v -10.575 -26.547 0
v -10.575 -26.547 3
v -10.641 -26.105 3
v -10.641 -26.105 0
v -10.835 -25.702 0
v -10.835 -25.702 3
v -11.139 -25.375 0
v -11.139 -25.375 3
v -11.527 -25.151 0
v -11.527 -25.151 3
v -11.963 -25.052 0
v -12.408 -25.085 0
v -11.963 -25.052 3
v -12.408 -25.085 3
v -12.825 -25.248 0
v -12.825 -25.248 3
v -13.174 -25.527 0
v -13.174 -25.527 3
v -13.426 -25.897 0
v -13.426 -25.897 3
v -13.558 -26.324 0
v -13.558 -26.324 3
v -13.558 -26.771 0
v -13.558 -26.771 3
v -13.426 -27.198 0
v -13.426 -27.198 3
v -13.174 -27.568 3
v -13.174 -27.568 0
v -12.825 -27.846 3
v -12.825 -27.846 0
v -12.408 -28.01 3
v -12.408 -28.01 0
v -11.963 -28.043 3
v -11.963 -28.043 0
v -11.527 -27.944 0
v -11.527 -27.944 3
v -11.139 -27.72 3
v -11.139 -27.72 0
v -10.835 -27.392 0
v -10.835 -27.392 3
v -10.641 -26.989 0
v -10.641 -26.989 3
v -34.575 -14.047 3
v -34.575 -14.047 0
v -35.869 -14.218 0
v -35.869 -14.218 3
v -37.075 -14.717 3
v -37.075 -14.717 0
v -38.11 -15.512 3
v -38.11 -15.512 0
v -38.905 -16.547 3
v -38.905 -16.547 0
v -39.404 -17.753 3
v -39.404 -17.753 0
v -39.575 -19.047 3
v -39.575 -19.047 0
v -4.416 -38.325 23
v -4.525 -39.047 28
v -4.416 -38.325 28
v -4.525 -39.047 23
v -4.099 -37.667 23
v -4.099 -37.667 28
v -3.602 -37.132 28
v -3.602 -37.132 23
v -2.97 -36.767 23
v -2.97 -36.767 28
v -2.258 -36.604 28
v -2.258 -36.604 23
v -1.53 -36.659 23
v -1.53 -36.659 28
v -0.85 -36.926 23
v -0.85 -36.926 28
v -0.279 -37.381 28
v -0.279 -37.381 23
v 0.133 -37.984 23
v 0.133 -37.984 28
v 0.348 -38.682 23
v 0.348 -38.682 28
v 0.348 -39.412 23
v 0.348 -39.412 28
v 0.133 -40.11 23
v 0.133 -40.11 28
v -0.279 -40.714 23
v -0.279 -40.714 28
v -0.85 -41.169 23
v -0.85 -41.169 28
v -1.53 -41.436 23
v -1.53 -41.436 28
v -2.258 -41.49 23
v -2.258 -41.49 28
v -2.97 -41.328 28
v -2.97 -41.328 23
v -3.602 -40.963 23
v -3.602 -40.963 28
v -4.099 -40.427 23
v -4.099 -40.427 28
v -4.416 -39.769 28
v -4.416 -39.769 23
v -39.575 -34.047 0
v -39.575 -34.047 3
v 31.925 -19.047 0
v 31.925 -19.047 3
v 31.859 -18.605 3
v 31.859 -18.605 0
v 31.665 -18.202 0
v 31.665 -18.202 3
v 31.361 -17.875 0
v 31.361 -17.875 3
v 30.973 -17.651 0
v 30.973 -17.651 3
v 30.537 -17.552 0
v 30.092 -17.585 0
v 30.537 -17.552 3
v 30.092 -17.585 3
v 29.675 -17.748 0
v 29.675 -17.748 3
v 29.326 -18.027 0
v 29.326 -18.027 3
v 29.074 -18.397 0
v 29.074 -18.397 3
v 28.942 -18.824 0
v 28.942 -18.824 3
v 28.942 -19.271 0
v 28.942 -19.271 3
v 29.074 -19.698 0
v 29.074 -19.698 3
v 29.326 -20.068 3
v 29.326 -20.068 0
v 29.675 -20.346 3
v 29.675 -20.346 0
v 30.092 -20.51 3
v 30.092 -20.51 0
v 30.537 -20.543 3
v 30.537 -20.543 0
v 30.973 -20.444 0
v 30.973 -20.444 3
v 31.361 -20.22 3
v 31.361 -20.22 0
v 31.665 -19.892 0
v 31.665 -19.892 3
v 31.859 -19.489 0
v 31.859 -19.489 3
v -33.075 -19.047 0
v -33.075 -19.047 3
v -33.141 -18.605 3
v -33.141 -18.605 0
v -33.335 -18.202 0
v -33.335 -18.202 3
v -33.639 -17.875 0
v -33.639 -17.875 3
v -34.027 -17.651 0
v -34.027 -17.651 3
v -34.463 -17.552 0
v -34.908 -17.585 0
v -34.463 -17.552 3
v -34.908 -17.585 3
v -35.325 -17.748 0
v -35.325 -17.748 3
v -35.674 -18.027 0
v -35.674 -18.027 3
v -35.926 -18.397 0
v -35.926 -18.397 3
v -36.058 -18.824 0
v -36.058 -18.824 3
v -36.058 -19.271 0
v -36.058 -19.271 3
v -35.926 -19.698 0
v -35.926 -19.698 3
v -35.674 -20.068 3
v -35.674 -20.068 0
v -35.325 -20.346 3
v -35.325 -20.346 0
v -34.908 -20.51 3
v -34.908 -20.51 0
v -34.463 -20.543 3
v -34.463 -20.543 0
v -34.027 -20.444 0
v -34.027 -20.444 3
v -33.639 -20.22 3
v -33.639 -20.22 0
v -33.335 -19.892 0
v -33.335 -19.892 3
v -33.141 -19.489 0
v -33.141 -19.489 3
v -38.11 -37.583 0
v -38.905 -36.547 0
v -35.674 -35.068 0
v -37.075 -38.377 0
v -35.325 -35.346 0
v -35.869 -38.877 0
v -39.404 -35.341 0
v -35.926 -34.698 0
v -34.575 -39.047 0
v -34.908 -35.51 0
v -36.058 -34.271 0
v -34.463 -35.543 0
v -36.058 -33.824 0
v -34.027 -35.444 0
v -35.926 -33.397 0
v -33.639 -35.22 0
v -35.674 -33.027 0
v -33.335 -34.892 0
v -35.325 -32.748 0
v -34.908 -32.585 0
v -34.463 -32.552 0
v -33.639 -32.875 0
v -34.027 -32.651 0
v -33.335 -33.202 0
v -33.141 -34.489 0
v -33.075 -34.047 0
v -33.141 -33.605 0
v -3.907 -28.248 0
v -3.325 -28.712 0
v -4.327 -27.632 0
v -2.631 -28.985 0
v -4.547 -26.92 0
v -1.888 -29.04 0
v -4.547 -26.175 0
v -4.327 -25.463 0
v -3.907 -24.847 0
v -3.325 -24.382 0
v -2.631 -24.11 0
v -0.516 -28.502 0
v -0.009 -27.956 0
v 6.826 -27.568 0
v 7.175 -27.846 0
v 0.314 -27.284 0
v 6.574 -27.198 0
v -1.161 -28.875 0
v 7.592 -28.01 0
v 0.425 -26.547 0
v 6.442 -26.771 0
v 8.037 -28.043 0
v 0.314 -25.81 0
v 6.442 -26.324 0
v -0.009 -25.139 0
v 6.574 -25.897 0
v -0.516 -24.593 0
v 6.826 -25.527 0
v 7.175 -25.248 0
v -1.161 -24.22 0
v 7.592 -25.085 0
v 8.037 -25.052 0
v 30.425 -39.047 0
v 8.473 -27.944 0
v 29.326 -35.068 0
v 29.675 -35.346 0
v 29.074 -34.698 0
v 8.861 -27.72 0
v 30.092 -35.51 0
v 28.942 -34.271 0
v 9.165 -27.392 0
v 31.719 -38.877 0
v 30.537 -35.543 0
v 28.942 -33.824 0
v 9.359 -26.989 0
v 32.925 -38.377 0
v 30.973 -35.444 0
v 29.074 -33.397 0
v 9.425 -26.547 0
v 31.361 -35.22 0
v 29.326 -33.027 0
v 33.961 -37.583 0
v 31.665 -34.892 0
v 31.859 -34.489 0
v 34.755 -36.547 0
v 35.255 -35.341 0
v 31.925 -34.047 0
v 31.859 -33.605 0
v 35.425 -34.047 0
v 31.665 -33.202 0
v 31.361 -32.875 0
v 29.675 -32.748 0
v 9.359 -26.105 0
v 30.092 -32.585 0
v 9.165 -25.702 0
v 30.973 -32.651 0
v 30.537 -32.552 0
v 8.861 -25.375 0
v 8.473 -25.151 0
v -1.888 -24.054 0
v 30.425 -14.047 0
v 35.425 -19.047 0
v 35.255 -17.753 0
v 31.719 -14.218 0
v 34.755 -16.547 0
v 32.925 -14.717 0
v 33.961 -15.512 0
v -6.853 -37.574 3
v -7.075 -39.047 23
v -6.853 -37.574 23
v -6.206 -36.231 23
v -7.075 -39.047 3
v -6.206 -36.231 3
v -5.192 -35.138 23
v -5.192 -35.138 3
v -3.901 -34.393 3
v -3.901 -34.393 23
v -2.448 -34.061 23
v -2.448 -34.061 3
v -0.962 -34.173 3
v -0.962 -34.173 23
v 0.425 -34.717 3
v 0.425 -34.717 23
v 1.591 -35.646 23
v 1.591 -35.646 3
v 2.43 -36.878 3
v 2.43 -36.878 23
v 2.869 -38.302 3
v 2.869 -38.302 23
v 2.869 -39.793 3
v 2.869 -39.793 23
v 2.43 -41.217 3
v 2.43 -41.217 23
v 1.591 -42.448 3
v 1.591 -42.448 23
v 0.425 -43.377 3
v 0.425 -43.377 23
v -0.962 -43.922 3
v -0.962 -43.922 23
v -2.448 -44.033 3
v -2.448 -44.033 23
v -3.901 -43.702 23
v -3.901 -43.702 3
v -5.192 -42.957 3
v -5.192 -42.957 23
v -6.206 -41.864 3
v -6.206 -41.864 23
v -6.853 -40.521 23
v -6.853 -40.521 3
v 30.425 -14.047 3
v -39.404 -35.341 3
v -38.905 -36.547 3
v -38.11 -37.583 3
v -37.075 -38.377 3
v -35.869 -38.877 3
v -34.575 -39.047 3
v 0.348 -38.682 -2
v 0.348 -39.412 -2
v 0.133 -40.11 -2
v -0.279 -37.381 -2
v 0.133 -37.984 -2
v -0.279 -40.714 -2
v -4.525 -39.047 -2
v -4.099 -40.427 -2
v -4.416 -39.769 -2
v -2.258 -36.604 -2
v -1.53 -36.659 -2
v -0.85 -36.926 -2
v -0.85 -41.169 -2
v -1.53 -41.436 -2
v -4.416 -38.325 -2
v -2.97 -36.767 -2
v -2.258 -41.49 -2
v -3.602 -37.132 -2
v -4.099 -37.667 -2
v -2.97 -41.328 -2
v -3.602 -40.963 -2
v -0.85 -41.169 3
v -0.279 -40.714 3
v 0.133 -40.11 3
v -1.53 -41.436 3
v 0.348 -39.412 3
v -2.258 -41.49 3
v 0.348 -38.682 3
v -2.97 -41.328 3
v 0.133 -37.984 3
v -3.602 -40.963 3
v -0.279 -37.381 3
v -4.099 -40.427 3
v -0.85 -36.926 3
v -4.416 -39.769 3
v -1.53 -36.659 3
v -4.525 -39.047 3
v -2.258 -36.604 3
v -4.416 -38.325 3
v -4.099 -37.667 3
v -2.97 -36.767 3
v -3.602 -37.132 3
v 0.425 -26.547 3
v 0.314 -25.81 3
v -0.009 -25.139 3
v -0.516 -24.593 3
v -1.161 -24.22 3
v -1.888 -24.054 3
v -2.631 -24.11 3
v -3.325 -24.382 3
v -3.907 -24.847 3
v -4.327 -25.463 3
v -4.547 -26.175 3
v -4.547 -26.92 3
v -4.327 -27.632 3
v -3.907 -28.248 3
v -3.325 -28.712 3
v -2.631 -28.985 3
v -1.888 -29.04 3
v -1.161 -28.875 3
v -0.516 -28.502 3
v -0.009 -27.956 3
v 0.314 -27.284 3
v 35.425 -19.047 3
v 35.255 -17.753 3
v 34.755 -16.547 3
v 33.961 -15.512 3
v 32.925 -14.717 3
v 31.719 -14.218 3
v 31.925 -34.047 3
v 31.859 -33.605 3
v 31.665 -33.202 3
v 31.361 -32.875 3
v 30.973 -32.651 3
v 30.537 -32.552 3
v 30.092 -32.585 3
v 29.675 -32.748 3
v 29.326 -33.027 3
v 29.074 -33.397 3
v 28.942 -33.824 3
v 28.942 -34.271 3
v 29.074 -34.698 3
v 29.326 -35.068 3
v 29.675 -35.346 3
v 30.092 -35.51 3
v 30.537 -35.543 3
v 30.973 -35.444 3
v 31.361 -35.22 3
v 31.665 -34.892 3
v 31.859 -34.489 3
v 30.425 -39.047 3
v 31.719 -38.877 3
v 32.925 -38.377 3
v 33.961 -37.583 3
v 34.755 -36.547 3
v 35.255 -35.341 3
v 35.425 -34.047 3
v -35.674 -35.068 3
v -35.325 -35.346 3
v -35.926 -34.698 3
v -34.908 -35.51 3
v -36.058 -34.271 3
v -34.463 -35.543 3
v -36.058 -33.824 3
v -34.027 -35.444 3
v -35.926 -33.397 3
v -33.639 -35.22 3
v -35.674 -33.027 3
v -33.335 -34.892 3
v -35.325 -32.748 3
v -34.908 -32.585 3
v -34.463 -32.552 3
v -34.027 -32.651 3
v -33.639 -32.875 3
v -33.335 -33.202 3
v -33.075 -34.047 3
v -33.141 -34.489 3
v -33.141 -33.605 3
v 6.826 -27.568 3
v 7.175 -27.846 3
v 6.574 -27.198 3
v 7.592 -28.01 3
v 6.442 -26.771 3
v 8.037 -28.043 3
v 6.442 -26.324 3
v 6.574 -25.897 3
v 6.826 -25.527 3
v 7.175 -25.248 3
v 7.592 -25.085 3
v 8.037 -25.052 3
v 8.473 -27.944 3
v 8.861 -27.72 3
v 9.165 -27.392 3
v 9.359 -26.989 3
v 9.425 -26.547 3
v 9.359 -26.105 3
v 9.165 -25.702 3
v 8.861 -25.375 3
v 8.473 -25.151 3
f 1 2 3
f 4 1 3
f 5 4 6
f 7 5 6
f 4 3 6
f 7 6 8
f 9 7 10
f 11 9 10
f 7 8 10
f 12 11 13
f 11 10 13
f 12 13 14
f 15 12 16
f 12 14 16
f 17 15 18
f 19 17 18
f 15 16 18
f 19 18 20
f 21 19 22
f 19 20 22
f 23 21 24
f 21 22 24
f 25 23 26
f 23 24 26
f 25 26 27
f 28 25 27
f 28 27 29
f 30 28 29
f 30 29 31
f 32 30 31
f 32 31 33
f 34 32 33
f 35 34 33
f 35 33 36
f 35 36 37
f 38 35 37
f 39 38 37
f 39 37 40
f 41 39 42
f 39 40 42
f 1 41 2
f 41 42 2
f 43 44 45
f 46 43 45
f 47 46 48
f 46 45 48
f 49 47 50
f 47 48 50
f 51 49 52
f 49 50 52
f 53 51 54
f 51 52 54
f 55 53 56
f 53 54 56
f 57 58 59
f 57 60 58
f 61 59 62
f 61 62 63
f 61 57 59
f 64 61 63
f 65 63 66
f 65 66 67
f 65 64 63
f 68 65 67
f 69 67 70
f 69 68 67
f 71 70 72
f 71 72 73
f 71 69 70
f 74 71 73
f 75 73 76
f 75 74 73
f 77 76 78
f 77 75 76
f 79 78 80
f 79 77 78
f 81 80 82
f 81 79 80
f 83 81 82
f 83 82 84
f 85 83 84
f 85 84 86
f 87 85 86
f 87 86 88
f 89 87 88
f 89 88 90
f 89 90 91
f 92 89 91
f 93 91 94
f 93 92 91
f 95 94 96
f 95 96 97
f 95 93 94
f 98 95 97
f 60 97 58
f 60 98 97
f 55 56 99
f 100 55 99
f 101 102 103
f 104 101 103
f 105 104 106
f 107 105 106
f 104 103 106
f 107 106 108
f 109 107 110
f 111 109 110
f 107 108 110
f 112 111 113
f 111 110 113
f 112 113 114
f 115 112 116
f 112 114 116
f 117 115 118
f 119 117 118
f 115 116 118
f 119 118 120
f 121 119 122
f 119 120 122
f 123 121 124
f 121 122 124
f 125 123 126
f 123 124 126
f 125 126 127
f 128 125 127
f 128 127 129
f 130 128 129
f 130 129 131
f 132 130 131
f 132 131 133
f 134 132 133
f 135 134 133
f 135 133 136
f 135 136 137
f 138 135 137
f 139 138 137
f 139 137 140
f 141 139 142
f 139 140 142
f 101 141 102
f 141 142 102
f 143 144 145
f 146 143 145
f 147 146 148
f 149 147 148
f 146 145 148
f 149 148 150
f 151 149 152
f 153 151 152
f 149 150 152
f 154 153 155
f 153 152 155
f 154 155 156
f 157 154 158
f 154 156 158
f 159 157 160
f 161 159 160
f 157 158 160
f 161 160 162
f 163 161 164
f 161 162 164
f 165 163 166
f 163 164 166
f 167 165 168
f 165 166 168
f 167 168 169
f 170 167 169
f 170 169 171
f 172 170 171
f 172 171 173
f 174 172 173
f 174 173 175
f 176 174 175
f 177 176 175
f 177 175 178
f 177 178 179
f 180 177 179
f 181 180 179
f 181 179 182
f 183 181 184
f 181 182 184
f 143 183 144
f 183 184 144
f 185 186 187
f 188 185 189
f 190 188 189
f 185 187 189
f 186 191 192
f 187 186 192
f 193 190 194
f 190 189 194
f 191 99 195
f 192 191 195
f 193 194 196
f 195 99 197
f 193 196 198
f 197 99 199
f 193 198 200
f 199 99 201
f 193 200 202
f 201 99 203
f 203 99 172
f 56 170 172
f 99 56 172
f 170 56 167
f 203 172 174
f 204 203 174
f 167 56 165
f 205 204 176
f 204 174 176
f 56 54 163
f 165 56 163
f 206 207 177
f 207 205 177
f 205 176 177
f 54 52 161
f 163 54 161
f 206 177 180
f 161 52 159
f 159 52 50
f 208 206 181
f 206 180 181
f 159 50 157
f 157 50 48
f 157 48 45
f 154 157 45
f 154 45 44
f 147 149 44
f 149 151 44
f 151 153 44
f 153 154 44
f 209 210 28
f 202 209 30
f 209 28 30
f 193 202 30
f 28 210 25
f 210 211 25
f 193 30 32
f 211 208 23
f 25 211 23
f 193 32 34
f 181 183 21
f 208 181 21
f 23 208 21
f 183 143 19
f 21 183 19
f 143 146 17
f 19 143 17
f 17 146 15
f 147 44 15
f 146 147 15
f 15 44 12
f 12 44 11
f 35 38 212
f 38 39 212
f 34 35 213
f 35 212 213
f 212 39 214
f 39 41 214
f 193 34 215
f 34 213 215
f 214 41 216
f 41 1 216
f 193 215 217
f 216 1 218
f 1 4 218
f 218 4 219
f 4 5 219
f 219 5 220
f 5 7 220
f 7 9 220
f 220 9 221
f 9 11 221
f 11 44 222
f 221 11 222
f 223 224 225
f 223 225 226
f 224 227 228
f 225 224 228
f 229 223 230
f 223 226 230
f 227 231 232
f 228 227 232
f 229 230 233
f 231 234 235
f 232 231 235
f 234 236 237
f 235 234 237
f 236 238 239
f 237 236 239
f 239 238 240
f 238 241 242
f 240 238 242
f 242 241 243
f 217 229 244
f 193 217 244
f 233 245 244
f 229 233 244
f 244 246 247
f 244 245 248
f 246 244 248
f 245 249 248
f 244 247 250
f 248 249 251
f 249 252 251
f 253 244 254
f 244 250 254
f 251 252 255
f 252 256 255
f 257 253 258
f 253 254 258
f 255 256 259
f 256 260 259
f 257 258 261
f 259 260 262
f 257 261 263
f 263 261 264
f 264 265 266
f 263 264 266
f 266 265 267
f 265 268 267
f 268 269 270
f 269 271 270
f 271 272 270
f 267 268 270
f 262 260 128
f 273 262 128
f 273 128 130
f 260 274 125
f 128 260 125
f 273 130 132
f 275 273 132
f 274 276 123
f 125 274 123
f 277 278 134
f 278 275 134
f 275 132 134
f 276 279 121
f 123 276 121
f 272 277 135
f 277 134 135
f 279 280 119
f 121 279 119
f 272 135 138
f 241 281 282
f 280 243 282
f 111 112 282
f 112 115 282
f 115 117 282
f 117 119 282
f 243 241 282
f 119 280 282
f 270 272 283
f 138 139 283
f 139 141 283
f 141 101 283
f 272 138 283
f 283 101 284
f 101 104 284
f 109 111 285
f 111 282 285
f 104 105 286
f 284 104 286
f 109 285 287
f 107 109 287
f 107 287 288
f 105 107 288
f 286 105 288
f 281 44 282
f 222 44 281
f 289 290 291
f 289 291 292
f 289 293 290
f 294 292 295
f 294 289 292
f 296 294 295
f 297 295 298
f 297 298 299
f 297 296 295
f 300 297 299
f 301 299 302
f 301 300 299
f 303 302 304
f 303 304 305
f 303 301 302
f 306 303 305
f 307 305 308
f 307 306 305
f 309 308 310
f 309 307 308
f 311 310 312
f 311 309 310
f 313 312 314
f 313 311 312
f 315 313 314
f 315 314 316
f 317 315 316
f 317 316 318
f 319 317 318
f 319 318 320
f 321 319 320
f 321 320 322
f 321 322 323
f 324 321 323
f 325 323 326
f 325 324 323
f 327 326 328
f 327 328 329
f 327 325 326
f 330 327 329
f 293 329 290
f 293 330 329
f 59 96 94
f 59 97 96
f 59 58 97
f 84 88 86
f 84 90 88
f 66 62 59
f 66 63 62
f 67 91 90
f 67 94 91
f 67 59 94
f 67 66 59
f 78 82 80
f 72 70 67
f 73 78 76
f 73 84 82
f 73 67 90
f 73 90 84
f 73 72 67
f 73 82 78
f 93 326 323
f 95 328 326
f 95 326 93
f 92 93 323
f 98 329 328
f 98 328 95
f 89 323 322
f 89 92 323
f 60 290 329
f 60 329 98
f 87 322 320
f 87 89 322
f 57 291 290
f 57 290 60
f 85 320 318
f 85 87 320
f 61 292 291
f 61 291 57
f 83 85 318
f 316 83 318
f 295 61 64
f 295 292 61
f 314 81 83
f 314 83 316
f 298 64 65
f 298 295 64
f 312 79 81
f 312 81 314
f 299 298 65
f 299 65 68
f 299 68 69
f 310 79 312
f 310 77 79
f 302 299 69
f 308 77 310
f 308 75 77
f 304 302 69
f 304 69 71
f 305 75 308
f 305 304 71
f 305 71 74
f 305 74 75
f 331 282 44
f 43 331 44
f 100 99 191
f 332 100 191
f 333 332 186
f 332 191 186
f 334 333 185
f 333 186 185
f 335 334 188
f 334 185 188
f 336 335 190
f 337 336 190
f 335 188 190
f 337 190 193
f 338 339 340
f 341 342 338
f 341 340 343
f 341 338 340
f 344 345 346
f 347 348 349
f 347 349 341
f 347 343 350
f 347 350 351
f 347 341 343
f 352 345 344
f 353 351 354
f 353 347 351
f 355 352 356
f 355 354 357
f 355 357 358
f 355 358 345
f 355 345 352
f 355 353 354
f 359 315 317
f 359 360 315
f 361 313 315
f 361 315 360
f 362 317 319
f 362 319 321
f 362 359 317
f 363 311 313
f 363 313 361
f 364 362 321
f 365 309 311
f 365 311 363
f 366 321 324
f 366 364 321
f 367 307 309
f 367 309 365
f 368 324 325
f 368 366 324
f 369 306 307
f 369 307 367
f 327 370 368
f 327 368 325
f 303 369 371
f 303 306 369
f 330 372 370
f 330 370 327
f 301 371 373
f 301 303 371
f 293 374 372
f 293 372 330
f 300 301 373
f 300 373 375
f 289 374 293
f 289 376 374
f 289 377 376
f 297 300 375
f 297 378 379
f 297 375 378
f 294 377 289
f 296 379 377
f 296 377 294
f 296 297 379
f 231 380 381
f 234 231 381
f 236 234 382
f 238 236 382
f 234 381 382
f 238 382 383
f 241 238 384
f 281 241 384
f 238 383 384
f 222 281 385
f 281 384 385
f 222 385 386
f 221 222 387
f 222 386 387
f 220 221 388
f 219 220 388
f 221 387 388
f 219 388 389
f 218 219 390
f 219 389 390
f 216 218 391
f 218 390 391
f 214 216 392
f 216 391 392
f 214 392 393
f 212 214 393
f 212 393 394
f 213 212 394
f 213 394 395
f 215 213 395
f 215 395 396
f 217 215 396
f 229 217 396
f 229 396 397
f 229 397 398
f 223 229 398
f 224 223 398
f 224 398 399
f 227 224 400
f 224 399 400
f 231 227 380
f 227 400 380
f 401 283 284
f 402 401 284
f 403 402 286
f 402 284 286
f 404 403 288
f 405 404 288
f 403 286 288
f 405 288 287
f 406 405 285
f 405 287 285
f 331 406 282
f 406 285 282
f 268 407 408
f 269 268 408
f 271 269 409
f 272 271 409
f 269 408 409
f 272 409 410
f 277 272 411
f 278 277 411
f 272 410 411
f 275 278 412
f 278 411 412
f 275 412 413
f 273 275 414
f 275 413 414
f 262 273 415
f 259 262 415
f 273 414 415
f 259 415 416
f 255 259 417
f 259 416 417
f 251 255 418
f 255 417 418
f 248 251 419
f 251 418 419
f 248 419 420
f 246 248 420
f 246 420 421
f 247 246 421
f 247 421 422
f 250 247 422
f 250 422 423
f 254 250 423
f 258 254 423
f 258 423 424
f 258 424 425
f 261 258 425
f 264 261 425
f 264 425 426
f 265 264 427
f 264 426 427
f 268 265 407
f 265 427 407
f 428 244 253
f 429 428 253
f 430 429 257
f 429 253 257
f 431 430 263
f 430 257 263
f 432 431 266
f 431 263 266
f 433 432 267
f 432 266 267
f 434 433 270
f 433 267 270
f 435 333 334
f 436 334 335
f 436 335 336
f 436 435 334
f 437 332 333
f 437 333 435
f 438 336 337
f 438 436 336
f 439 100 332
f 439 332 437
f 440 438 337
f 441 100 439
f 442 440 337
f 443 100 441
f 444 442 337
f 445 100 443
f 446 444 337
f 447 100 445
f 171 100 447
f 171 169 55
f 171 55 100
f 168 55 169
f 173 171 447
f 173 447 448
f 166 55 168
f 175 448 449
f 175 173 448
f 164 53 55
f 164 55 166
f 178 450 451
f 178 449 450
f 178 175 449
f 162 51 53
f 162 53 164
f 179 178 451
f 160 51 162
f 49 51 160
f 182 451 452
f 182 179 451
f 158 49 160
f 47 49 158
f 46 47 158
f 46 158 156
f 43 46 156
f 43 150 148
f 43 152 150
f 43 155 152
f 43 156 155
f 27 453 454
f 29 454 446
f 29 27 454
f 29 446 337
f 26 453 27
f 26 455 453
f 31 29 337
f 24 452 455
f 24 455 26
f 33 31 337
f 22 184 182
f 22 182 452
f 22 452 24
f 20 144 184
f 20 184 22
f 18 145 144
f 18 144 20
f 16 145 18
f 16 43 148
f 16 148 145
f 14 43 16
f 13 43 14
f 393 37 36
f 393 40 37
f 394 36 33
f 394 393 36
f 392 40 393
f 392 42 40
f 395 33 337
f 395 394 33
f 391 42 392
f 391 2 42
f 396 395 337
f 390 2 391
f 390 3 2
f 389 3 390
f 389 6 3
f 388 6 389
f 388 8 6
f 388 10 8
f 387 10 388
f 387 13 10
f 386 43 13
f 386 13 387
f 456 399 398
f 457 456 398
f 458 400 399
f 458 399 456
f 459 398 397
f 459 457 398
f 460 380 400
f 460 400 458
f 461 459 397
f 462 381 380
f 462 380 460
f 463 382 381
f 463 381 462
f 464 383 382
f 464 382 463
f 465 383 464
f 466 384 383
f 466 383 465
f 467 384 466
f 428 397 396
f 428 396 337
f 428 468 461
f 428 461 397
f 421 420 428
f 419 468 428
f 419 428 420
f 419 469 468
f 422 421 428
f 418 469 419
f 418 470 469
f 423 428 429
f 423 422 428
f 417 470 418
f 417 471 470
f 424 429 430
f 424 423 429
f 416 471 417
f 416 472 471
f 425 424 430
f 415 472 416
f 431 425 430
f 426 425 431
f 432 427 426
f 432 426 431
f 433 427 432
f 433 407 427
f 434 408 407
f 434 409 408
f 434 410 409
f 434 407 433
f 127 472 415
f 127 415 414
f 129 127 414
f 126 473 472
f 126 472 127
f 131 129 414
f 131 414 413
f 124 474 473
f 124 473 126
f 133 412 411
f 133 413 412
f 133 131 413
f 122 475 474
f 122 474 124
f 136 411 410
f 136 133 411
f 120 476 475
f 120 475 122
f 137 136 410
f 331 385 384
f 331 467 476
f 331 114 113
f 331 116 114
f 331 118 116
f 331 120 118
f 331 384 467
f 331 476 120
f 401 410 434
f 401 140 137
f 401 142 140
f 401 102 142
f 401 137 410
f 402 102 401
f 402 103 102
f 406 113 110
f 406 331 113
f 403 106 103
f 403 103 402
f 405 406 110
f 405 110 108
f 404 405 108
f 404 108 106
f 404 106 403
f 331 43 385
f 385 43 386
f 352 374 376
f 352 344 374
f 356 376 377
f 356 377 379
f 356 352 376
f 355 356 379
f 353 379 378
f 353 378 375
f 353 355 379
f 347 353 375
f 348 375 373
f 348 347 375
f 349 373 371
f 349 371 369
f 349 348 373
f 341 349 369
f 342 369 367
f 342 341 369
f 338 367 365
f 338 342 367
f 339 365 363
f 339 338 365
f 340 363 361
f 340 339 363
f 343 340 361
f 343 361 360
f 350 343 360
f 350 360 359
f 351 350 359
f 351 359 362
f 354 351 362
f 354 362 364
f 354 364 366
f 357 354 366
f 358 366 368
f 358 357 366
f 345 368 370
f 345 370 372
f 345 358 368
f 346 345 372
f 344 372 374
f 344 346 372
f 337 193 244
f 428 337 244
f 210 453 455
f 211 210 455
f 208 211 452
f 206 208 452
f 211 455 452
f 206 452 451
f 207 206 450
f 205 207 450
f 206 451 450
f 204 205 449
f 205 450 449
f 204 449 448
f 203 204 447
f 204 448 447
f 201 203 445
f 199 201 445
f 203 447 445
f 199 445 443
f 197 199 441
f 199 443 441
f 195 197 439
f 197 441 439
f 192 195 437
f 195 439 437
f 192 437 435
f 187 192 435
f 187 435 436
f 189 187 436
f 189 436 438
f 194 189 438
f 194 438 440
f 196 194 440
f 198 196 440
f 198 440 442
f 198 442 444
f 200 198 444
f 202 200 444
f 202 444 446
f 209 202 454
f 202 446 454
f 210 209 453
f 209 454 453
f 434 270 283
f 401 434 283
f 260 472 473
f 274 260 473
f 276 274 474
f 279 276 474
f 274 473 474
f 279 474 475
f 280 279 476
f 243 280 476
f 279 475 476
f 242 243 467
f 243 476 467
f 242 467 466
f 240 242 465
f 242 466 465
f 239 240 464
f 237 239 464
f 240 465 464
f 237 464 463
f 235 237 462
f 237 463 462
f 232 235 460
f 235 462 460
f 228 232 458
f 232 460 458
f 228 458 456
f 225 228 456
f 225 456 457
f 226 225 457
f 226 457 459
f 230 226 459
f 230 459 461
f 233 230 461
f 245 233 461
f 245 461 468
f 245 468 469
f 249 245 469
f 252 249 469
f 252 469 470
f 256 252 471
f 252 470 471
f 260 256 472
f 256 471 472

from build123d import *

# Parameters (mm, degrees)
F1_DEPTH = 3
F2_R     = 1.5
F2_R_2   = 2.5
F3_DEPTH = 3
F4_W     = 2.45
F4_H     = 2
F4_H_2   = 3


with BuildPart() as f1:
    # F0 (on Top) → F1 (new body)
    with BuildSketch(Plane.XY):
        with BuildLine():
            ThreePointArc((-39.5747060731, -34.0473439358), (-38.1102399791, -37.5828778418), (-34.5747060731, -39.0473439358))
            Line((-34.5747060731, -39.0473439358), (30.4252939269, -39.0473439358))
            ThreePointArc((30.4252939269, -39.0473439358), (33.9608278328, -37.5828778418), (35.4252939269, -34.0473439358))
            Line((35.4252939269, -34.0473439358), (35.4252939269, -19.0473439358))
            ThreePointArc((35.4252939269, -19.0473439358), (33.9608278328, -15.5118100299), (30.4252939269, -14.0473439358))
            Line((30.4252939269, -14.0473439358), (-34.5747060731, -14.0473439358))
            ThreePointArc((-34.5747060731, -14.0473439358), (-38.1102399791, -15.5118100299), (-39.5747060731, -19.0473439358))
            Line((-39.5747060731, -19.0473439358), (-39.5747060731, -34.0473439358))
        make_face()
    extrude(amount=F1_DEPTH)

    # F2 (on face) → F3 (cut, through all)
    with BuildSketch(Plane.XY.offset(3)):
        with Locations((-34.5747060731, -19.0473439358)):
            Circle(F2_R)
        with Locations((-34.5747060731, -34.0473439358)):
            Circle(F2_R)
        with Locations((30.4252939269, -19.0473439358)):
            Circle(F2_R)
        with Locations((30.4252939269, -34.0473439358)):
            Circle(F2_R)
        with Locations((-2.0747060731, -26.5473439358)):
            Circle(F2_R_2)
        with Locations((-12.0747060731, -26.5473439358)):
            Circle(F2_R)
        with Locations((7.9252939269, -26.5473439358)):
            Circle(F2_R)
    extrude(amount=-F3_DEPTH, mode=Mode.SUBTRACT)


with BuildPart() as f5:
    # F4 (on face) → F5 (revolve)
    with BuildSketch(Plane.XZ.offset(39.0473439358)):
        Polygon((-4.5247060731, 3), (-2.0747060731, 3), (-2.0747060731, 28), (-4.5247060731, 28), (-4.5247060731, 23), (-7.0747060731, 23), (-7.0747060731, 3), align=None)
        with Locations((-3.2997060731, -1)):
            Rectangle(F4_W, F4_H)
        with Locations((-3.2997060731, 1.5)):
            Rectangle(F4_W, F4_H_2)
    revolve(axis=Axis((-2.0747060731, -39.0473439358, 15.5), (0, 0, -1)))


solid = Compound([f1.part, f5.part])
